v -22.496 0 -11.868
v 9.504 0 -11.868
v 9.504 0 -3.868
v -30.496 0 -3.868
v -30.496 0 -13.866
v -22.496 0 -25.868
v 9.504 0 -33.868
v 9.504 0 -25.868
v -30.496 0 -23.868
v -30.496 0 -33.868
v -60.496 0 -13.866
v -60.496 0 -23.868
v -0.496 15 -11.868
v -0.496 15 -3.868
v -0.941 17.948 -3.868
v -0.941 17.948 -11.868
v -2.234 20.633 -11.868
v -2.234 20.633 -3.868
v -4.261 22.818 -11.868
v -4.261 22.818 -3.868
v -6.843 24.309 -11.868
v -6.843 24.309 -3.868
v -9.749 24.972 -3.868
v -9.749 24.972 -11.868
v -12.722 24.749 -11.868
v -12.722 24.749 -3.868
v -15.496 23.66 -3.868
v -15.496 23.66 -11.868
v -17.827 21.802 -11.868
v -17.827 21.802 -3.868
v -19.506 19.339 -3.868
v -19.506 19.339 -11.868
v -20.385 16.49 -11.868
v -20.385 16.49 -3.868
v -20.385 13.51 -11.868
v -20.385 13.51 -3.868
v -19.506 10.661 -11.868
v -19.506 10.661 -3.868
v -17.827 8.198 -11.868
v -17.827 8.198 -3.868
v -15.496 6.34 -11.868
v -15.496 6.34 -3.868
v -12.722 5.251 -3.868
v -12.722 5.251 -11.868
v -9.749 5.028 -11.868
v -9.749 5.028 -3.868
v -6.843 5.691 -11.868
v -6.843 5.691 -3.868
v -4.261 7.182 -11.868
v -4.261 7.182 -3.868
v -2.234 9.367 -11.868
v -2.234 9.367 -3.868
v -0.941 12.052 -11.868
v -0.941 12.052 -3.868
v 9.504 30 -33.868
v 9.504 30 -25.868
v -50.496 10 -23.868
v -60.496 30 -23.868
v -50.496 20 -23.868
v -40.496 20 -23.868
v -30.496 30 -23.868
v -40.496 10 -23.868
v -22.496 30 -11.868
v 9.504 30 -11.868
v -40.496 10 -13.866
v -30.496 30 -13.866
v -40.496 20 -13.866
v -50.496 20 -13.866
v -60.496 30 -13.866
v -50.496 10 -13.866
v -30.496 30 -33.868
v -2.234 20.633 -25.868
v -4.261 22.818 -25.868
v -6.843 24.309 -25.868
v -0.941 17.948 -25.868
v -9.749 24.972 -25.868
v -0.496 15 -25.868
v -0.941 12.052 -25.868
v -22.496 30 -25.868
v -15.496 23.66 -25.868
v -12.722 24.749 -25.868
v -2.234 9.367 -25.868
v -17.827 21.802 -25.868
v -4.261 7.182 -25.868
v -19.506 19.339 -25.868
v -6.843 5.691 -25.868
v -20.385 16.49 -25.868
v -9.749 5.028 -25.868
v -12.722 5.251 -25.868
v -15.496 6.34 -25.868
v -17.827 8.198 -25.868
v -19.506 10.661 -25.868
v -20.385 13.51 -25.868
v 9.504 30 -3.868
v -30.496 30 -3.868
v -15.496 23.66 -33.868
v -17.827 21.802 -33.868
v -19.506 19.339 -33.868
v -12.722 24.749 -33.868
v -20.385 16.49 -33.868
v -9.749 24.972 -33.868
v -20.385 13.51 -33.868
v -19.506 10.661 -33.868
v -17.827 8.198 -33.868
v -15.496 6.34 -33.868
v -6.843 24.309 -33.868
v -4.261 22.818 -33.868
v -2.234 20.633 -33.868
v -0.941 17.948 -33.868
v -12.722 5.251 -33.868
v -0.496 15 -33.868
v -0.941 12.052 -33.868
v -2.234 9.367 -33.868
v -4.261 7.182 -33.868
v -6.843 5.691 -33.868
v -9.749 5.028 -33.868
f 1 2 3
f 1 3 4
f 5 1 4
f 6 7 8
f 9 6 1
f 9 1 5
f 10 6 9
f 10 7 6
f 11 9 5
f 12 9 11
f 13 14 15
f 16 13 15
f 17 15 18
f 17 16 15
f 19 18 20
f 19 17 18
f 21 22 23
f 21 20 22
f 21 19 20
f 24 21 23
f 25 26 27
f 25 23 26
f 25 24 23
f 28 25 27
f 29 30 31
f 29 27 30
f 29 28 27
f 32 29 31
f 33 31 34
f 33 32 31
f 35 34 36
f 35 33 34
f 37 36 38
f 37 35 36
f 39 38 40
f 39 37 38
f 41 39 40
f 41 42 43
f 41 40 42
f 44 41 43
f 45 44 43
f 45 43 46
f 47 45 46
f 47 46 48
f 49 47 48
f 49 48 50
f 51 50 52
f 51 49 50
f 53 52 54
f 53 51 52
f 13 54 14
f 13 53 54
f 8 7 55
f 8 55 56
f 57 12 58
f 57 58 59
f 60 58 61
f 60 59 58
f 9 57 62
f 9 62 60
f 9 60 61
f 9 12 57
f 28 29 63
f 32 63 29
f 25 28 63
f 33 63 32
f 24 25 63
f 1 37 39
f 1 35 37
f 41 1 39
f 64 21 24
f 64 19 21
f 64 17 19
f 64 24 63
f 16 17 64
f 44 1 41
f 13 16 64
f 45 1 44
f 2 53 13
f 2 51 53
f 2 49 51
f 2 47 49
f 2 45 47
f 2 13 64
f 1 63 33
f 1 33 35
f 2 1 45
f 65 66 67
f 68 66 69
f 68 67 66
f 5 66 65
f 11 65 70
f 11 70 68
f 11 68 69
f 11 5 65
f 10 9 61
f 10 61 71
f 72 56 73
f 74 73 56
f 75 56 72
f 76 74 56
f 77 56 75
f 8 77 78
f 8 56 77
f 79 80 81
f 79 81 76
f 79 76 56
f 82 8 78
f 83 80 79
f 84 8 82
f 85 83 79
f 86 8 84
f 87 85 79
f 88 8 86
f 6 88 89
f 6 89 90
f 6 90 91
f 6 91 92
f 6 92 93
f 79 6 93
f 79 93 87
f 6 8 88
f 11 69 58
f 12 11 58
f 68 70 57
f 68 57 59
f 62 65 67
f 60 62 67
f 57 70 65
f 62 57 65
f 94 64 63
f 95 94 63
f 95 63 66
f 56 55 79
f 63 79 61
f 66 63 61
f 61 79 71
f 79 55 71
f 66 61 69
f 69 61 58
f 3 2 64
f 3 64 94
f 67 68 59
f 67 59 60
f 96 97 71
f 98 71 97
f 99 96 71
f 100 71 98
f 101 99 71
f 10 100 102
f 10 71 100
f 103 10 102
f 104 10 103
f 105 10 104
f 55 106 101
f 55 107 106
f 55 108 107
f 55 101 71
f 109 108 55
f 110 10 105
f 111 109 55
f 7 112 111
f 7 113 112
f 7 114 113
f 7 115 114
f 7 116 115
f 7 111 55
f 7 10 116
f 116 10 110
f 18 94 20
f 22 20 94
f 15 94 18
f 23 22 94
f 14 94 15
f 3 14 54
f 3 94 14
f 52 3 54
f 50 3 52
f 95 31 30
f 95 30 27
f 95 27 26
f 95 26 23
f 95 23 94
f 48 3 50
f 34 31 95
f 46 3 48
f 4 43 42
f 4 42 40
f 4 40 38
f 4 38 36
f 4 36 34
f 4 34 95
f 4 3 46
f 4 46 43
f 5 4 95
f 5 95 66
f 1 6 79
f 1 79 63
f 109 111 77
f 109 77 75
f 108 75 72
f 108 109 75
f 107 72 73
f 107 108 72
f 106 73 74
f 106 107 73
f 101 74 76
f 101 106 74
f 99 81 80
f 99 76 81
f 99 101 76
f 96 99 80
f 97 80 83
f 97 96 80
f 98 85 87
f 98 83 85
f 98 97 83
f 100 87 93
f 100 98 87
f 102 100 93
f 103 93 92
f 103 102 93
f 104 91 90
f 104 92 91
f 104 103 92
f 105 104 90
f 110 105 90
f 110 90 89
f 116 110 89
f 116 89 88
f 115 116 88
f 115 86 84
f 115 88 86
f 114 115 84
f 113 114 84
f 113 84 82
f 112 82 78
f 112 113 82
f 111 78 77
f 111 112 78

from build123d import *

# Parameters (mm, degrees)
EXTRUDE_1_DEPTH          = 30
CUT_EXTRUDE_1_DEPTH      = 74.890488337
CUT_EXTRUDE_1_DEPTH_BACK = 74.890488337
SKETCH_2_R               = 10
SKETCH_4_W               = 10
SKETCH_4_H               = 10
CUT_EXTRUDE_2_DEPTH      = 71.426335574


with BuildPart() as part:
    # 스케치1 → 보스-돌출1 (new body)
    with BuildSketch(Plane(origin=(0, 0, 0), x_dir=(1, 0, 0), z_dir=(0, 1, 0))):
        Polygon((-30.496316142, 3.867716008), (-30.496316142, 13.866104182), (-60.496316142, 13.866104182), (-60.496316142, 23.867716008), (-30.496316142, 23.867716008), (-30.496316142, 33.867716008), (9.503683858, 33.867716008), (9.503683858, 25.867716008), (-22.496316142, 25.867716008), (-22.496316142, 11.867716008), (9.503683858, 11.867716008), (9.503683858, 3.867716008), align=None)
    extrude(amount=EXTRUDE_1_DEPTH)

    # 스케치2 → 컷-돌출1 (cut, two sides: drawn at the far end of the back side and taken through both)
    with BuildSketch(Plane.XY.offset(-3.867716008).offset(-CUT_EXTRUDE_1_DEPTH_BACK)):
        with Locations((-10.496316142, 15)):
            Circle(SKETCH_2_R)
    extrude(amount=CUT_EXTRUDE_1_DEPTH + CUT_EXTRUDE_1_DEPTH_BACK, mode=Mode.SUBTRACT)

    # 스케치4 → 컷-돌출2 (cut, through all)
    with BuildSketch(Plane.XY.offset(-13.866104182)):
        with Locations((-45.496316142, 15)):
            Rectangle(SKETCH_4_W, SKETCH_4_H)
    extrude(amount=-CUT_EXTRUDE_2_DEPTH, mode=Mode.SUBTRACT)


solid = part.part
